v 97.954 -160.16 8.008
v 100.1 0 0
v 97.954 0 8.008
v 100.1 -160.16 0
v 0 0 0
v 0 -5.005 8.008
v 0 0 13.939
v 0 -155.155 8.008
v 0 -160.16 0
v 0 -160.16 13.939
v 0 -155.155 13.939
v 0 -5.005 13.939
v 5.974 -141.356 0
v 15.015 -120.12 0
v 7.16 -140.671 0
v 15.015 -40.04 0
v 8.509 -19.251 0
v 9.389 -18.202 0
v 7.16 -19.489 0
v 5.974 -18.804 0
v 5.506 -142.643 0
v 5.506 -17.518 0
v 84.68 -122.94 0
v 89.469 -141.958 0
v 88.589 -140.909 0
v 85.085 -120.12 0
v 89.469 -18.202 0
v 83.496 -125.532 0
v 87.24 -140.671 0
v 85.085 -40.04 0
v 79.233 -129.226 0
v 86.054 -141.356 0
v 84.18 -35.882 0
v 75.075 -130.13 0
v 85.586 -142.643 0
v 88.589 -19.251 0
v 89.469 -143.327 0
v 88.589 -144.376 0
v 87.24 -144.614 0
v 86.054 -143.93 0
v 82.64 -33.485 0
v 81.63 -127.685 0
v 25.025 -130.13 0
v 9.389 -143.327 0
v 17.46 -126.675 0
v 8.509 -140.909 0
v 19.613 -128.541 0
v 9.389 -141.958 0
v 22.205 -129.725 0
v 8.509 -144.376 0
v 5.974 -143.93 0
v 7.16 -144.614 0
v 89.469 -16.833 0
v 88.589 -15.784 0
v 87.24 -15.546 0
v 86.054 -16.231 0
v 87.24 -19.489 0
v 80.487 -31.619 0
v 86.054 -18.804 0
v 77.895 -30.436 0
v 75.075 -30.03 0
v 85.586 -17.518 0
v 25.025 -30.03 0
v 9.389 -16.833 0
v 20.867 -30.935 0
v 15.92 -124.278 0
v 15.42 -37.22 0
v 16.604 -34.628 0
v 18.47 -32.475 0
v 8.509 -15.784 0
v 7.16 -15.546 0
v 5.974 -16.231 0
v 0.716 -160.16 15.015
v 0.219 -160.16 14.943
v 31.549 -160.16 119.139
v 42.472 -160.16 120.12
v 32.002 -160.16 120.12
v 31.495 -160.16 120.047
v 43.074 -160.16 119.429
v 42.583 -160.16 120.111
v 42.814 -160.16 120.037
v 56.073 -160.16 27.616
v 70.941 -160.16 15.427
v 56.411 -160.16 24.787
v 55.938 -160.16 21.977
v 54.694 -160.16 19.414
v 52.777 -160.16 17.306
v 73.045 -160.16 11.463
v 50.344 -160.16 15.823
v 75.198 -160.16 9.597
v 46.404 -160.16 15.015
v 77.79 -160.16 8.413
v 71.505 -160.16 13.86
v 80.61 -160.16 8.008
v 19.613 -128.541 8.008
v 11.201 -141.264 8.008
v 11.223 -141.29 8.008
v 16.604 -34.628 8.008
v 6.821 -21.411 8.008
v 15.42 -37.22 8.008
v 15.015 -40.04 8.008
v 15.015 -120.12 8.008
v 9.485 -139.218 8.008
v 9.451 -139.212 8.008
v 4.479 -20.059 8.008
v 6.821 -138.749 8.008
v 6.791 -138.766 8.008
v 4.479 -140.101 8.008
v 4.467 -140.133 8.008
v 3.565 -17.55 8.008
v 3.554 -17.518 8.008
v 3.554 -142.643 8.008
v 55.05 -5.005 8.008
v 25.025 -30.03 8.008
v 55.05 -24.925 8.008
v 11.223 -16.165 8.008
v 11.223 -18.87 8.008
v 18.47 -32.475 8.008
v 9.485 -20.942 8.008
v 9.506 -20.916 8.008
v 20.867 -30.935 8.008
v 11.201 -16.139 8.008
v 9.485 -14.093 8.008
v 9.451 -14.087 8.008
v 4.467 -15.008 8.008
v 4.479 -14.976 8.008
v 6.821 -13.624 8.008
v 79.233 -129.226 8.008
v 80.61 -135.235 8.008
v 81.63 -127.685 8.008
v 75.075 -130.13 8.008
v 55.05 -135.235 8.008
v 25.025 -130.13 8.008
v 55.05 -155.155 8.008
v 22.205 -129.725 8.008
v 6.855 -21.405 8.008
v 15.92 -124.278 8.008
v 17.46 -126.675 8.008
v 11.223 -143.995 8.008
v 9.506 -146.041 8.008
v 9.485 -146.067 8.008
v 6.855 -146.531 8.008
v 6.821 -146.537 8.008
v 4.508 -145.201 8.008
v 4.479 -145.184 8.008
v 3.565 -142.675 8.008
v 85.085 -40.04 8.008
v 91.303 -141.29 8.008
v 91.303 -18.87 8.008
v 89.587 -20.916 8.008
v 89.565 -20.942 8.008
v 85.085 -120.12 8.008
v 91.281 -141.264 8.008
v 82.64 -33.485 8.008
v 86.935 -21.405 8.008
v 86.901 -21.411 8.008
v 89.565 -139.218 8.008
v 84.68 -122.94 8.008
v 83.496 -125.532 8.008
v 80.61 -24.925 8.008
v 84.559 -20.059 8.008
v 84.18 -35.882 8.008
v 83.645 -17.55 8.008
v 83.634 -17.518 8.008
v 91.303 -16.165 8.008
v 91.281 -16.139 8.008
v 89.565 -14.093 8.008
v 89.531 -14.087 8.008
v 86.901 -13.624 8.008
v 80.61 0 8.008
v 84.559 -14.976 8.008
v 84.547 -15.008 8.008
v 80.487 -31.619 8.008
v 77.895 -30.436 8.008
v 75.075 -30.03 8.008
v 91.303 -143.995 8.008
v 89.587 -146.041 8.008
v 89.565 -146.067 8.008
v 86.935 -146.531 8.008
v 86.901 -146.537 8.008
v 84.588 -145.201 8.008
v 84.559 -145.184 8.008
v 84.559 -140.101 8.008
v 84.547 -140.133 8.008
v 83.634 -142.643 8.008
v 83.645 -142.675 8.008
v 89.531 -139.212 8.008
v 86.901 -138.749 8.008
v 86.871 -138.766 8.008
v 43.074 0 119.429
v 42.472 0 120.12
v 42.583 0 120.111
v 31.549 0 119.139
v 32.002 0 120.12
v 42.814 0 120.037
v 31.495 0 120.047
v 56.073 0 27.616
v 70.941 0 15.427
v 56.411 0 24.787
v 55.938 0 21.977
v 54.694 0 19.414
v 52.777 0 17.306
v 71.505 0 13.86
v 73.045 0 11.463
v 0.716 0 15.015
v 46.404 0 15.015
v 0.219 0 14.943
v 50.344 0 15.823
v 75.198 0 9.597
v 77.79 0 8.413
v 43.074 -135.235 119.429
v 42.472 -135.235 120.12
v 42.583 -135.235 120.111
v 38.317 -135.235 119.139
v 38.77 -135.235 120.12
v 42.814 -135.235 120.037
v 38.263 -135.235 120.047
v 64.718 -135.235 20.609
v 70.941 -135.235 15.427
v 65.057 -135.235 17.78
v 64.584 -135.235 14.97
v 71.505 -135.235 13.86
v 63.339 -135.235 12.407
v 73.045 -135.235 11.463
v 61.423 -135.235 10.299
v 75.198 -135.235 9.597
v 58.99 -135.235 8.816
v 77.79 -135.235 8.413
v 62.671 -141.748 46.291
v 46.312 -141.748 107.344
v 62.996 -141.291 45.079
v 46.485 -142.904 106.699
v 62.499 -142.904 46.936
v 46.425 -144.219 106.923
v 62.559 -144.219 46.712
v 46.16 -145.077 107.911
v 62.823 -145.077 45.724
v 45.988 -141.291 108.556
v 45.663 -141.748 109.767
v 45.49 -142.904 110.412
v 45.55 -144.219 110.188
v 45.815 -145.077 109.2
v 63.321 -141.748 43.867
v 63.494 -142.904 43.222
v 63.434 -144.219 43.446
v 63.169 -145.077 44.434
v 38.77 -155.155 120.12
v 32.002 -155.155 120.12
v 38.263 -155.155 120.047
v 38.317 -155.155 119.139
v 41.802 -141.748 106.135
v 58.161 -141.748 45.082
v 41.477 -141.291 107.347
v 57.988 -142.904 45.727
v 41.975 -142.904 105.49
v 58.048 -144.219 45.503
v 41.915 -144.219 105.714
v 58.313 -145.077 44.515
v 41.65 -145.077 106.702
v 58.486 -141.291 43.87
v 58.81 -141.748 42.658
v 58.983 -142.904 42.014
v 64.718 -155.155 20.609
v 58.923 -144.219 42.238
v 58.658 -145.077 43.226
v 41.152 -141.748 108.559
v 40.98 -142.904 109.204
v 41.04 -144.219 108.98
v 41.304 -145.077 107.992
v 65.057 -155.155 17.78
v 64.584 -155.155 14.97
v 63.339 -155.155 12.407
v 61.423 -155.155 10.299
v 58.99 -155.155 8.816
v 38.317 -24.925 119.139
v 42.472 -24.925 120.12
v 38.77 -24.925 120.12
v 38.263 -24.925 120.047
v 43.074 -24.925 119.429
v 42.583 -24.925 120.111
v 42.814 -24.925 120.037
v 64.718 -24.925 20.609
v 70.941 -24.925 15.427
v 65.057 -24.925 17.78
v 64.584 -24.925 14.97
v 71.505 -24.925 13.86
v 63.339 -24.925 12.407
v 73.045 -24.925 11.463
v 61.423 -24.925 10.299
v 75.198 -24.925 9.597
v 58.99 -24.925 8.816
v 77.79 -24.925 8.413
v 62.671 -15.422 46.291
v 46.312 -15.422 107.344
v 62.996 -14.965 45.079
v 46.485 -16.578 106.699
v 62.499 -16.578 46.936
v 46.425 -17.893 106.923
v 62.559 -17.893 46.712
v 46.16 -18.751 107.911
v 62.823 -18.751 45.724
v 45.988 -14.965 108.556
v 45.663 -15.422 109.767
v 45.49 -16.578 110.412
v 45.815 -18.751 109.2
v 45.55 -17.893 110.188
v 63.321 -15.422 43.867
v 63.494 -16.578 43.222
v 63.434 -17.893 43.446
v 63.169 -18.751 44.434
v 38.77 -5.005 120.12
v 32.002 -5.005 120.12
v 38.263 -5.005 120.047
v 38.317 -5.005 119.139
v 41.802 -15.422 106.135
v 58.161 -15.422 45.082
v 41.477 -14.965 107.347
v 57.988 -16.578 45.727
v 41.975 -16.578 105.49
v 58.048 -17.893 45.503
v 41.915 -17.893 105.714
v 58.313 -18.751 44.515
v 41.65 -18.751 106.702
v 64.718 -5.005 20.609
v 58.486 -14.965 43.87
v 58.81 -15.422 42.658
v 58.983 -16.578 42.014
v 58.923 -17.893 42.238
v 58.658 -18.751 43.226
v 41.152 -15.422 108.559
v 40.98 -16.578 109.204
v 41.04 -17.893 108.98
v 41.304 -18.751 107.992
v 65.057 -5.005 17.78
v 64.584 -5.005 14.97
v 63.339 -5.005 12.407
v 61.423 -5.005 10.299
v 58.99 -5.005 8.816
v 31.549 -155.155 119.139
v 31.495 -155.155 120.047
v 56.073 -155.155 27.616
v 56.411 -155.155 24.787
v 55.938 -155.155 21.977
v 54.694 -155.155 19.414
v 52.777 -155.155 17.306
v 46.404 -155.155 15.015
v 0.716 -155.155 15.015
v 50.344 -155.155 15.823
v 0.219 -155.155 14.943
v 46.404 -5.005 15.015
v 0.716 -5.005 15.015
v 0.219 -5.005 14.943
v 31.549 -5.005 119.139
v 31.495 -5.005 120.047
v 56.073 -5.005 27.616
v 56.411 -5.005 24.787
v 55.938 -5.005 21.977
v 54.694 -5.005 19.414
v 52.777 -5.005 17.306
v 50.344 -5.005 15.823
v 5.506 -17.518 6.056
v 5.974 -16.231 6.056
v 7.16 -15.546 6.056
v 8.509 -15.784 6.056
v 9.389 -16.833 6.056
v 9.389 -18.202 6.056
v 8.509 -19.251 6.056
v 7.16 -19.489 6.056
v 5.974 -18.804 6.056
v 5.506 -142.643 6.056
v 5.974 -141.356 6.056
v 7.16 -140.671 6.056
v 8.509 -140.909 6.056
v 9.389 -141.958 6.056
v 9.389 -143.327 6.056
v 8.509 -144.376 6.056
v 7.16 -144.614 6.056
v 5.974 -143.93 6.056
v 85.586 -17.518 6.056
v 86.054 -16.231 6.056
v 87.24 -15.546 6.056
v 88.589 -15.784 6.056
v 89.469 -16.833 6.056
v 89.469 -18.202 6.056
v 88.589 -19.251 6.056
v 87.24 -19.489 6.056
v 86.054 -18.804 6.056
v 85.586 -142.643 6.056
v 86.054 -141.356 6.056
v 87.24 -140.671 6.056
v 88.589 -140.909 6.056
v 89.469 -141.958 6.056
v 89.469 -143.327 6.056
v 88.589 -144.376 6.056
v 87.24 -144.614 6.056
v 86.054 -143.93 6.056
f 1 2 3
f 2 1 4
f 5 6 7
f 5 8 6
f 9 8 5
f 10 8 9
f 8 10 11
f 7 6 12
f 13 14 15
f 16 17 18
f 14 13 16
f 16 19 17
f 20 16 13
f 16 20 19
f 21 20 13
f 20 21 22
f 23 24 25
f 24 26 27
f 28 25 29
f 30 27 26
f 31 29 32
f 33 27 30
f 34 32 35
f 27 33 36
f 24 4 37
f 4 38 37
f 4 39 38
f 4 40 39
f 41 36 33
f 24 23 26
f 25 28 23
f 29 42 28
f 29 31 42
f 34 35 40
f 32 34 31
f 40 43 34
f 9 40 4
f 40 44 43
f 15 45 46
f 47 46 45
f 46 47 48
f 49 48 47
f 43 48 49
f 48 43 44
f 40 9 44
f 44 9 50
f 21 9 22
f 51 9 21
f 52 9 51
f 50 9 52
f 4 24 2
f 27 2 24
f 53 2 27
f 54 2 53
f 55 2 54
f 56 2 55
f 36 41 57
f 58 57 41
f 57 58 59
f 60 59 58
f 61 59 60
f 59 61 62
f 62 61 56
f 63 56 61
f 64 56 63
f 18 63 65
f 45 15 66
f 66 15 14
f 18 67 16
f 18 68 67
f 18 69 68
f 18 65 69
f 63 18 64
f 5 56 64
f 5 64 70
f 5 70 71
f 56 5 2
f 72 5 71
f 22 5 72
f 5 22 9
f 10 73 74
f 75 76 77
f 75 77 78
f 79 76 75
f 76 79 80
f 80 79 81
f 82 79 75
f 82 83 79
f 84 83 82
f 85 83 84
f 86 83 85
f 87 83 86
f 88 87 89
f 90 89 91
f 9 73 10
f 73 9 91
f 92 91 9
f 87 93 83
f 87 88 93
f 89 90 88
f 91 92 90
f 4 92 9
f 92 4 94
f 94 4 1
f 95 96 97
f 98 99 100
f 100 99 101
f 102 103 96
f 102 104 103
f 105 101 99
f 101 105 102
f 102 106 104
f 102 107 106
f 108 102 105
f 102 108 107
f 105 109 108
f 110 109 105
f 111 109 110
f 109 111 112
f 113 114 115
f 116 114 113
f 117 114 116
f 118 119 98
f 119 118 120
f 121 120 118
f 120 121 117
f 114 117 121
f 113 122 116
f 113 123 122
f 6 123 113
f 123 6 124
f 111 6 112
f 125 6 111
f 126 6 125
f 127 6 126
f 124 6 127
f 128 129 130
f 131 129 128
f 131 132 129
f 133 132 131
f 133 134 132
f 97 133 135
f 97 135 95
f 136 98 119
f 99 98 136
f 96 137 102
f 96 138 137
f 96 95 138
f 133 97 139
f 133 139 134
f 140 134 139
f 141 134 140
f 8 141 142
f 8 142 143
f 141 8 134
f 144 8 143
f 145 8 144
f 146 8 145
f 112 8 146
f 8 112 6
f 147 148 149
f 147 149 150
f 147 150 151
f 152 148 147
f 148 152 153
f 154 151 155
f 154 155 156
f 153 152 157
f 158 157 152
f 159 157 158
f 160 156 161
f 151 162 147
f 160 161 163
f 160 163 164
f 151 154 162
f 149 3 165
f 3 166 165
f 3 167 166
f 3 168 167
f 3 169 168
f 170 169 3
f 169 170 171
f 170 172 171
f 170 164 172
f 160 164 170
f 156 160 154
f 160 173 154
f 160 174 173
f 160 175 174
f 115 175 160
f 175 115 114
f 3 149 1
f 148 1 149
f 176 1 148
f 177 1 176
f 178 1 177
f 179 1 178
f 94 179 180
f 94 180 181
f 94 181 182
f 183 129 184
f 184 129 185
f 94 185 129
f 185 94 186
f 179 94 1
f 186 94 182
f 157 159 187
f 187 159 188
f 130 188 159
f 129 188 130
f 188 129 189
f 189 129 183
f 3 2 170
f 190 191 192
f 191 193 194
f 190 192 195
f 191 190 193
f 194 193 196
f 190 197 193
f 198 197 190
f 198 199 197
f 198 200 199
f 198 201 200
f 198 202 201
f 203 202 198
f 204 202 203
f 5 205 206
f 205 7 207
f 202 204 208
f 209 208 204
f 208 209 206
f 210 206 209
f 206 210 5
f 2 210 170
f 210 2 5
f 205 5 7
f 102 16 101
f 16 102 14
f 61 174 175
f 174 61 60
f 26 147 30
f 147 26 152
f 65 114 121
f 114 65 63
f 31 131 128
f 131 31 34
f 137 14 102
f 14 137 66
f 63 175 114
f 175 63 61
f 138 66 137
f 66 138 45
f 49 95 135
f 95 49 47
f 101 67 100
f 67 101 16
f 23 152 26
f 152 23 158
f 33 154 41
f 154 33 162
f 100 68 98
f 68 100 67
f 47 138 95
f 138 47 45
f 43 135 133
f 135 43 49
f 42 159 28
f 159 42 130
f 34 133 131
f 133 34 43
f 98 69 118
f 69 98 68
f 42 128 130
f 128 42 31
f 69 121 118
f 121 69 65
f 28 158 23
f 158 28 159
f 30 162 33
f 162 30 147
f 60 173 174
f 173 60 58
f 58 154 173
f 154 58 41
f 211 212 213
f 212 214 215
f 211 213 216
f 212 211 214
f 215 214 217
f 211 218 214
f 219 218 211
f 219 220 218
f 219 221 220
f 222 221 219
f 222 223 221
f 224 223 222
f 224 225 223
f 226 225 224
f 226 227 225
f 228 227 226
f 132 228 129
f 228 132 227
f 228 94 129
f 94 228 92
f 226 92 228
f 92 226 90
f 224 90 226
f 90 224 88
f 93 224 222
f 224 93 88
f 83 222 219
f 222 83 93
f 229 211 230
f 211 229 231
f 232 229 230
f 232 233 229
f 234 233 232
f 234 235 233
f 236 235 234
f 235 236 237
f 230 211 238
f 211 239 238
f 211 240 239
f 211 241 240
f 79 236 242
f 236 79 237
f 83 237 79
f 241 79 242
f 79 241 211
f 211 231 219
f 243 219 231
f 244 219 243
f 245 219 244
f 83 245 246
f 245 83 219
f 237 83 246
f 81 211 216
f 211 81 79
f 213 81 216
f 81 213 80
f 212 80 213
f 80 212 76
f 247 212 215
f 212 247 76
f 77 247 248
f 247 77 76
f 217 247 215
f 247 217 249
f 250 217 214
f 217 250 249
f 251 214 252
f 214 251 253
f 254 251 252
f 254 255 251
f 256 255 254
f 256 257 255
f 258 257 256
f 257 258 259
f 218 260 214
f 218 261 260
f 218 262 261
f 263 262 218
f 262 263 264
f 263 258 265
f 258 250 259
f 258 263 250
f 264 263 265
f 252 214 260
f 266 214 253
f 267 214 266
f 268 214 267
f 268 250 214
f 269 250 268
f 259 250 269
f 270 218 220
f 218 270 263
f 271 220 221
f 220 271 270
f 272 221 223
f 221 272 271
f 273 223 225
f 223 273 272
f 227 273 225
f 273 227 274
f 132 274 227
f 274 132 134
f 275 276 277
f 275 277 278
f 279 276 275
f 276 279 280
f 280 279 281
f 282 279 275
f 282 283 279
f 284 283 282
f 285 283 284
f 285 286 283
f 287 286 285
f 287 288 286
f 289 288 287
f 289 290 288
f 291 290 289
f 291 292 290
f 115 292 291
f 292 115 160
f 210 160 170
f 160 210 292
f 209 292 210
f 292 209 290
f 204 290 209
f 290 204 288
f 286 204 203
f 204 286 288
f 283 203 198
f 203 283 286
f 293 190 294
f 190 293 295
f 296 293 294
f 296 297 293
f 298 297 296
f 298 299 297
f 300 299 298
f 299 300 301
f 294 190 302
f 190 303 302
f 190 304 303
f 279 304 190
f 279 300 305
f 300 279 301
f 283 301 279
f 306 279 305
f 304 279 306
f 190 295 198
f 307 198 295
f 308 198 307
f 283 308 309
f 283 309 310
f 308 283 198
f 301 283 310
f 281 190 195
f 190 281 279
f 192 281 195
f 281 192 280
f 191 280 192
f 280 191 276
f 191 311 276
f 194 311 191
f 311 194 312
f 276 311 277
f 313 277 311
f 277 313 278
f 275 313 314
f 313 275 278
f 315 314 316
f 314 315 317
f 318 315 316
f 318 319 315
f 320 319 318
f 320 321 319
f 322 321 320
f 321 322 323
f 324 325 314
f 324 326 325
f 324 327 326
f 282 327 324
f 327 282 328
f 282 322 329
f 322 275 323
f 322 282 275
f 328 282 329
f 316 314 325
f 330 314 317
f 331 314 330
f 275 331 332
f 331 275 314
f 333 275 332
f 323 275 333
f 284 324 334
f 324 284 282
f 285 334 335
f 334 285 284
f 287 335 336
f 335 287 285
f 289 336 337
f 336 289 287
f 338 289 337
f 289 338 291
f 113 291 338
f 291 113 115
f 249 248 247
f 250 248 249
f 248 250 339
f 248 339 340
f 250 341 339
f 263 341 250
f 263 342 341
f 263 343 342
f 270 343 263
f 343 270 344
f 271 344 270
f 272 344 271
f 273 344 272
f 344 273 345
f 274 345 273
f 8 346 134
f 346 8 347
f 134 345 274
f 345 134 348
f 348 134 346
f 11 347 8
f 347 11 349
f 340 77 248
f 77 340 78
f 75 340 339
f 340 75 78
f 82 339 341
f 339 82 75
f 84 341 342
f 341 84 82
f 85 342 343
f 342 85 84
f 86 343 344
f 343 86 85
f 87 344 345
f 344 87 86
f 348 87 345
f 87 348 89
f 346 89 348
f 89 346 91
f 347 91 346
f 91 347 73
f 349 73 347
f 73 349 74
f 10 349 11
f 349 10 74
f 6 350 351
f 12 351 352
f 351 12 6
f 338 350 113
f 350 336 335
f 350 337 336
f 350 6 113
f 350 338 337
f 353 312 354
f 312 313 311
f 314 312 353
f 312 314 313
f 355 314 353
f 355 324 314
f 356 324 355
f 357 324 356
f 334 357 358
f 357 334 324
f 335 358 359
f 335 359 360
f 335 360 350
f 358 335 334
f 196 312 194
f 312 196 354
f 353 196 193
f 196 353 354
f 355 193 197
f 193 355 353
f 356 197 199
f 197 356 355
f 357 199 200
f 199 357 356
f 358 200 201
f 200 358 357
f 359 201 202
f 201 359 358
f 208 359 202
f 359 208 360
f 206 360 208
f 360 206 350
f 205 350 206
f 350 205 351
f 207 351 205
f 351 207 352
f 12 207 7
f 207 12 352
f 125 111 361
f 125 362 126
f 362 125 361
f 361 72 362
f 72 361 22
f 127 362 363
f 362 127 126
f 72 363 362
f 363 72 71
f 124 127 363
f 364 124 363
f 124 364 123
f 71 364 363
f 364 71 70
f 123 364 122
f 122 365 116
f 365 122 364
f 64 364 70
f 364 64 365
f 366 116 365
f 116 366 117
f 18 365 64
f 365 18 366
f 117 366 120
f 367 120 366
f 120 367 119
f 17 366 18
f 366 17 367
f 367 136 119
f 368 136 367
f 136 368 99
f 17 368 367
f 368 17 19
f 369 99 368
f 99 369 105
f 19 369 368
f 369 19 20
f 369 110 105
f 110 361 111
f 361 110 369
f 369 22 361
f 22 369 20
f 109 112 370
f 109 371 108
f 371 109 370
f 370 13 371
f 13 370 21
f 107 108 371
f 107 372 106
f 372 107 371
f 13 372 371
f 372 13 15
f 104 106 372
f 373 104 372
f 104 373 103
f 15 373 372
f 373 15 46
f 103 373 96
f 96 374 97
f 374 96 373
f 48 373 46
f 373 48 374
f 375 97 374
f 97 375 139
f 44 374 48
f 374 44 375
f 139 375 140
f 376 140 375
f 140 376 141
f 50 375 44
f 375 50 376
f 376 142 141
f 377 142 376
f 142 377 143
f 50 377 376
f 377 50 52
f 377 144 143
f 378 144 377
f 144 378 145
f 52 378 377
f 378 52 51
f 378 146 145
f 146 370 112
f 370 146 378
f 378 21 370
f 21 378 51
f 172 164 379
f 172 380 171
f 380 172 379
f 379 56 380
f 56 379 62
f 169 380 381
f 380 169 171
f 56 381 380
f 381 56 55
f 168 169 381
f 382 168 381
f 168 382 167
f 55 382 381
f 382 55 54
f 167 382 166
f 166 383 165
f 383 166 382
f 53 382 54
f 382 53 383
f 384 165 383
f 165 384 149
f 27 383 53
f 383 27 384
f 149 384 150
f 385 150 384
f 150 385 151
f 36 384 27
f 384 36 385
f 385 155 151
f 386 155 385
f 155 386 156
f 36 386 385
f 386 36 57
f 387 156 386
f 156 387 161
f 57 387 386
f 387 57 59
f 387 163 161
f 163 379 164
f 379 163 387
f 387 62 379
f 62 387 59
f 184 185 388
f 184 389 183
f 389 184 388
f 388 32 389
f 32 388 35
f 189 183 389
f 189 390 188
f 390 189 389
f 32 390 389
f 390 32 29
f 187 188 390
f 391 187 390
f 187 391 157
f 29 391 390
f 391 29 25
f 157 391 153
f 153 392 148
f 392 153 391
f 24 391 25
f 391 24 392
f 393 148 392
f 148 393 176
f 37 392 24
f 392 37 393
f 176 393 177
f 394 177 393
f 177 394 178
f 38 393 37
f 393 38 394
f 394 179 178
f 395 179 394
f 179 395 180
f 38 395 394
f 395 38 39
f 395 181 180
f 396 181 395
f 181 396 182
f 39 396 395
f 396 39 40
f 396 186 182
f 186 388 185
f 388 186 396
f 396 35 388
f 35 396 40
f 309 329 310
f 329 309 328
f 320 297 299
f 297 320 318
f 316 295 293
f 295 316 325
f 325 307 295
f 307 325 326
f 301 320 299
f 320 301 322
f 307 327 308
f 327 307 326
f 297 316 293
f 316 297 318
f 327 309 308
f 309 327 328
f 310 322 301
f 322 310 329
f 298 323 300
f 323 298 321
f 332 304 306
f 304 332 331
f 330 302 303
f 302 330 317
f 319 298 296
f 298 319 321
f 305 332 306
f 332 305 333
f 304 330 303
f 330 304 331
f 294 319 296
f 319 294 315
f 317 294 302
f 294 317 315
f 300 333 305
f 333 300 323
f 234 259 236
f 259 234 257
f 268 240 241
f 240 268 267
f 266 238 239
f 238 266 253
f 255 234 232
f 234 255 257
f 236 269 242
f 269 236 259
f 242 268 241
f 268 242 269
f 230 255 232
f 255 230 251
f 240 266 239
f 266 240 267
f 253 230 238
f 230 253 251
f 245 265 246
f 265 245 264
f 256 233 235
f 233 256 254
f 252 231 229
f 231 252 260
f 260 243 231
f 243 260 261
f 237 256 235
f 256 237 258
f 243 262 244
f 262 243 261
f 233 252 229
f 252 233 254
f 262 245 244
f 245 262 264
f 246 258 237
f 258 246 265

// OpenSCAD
//------------------------------------------------------------------
/*

Simple Display Stand for Rasberry Pi 7" Display

Similar to: http://www.thingiverse.com/thing:1021025

But:

1) OpenSCAD.
2) Allow the usb power port to be at the bottom (normal display orientation).
3) Provide mounting holes on the foot.
4) Variable thickness display supports to accomodate various M3 screw lengths.
5) Added webbing for better strength.
6) Adjustable foot size for better free-standing stability.

*/
//------------------------------------------------------------------
/* [Global] */

display_angle = 15;

base_height = 8;
base_length = 160;
base_width = 100;
base_mount_hole_diameter = 4;
base_hole_rounding = 10;
base_mount_hole_posn = 0.8;

foot_sizex = 15;
foot_sizey = 30;

support_posn = 0.75;
support_height = 120;
support_thickness = 5;
support_hole2edge = 8;

web_thickness = 7;
web_radius = 10;

/* [Hidden] */
//------------------------------------------------------------------
// utility functions

// scaling
pla_shrink = 1/0.999; //~0.1%
abs_shrink = 1/0.995; //~0.5%
function scale(x) = pla_shrink * x;

// small tweak to avoid differencing artifacts
epsilon = 0.05;

// control the number of facets on cylinders
facet_epsilon = 0.1;
function facets(r) = 180 / acos(1 - (facet_epsilon / r));

// rounded/filleted edges
module inverse() {
  difference() {
    square(1e5, center=true);
    children(0);
  }
}
module rounded(r=1) {
  offset(r=r, $fn=facets(r)) offset(r=-r, $fn=facets(r)) children(0);
}
module filleted(r=1) {
  offset(r=-r, $fn=facets(r)) render() offset(r=r, $fn=facets(r)) children(0);
}

//------------------------------------------------------------------

// 4 x M3 mounting holes on display
mount_hole_w = scale(126.20);
mount_hole_h = scale(65.65);
display_mhr = scale(3.9/2);

// derived values
base_h = scale(base_height);
base_w = scale(base_width);
base_l = scale(base_length);
base_hr = scale(base_hole_rounding);
base_mhr = scale(base_mount_hole_diameter/2);

foot_sx = scale(foot_sizex);

support_h = scale(support_height);
support_t = scale(support_thickness);
support_h2e = scale(support_hole2edge);

web_t = scale(web_thickness);
web_r = scale(web_radius);

support_face_w = support_h2e + ((base_l - mount_hole_w) / 2);
foot_sy = max(support_face_w, scale(foot_sizey));

//------------------------------------------------------------------
// general screw hole: length, radius, style

module hole(l, r, style) {
  if (style == "countersunk") {
    if (r > l) {
      points = [
        [0, 0],
        [(2 * r) - l, 0],
        [2 * r, l],
        [0, l]
      ];
      rotate_extrude($fn=facets(r)) polygon(points=points);
    } else {
      points = [
        [0, 0],
        [r, 0],
        [r, l - r],
        [2 * r, l],
        [0, l]
      ];
      rotate_extrude($fn=facets(r)) polygon(points=points);
    }
  } else {
    // plain hole
    cylinder(h=l, r=r, $fn=facets(r));
  }
}

//------------------------------------------------------------------

module base_2d(h, w) {
  delta = h * tan(display_angle);
  points = [
    [0, 0],
    [0, h],
    [w - delta, h],
    [w, 0],
  ];
  polygon(points=points);
}

module support_2d(t) {
  d0 = support_h * tan(display_angle);
  d1 = t * cos(display_angle);
  x0 = base_w * support_posn;
  points = [
    [x0, 0],
    [x0 - d1, 0],
    [x0 - d1 - d0, support_h],
    [x0 - d0, support_h],
  ];
  polygon(points=points);
}

//------------------------------------------------------------------
// web

module web_profile() {
  filleted(r=web_r) union() {
    support_2d(support_t + web_t);
    base_2d(base_h + web_t, base_w * support_posn);
  }
}

module web_right() {
  linear_extrude(height=support_t) web_profile();
}

module web_left() {
  translate([0,0,base_l - support_t]) web_right();
}

module web() {
  web_left();
  web_right();
}

//------------------------------------------------------------------
// base

module base_body_profile() {
  base_2d(base_h, base_w);
}

module base_hole_profile() {
  sx = base_w - (2 * foot_sx);
  sy = base_l - (2 * foot_sy);
  rounded(r=base_hr) square(size=[sx, sy]);
}

module base() {
  h = base_h + (2 * epsilon);
  difference() {
    linear_extrude(height=base_l) base_body_profile();
    translate([foot_sx,base_h + epsilon,foot_sy]) rotate([90,0,0]) linear_extrude(height=h) base_hole_profile();
  }
}

module base_mount_hole() {
  l = base_h + (2 * epsilon);
  translate([0,-epsilon,0]) rotate([-90,0,0]) hole(l=l, r=base_mhr, style="countersunk");
}

module base_mount_holes() {
  z0 = (foot_sy + support_t) / 2;
  z1 = base_l - z0;
  x0 = foot_sx / 2;
  x1 = x0 + (base_mount_hole_posn * base_w);
  union() {
    translate([x0,0,z0]) base_mount_hole();
    translate([x0,0,z1]) base_mount_hole();
    translate([x1,0,z0]) base_mount_hole();
    translate([x1,0,z1]) base_mount_hole();
  }
}

//------------------------------------------------------------------
// supports

module support_profile() {
  filleted(r=web_r) union() {
    base_2d(base_h, base_w);
    support_2d(support_t);
  }
}

module support_right() {
  linear_extrude(height=support_face_w) support_profile();
}

module support_left() {
  translate([0,0,base_l - support_face_w]) support_right();
}

module support() {
  support_left();
  support_right();
}

module display_mount_hole() {
  l = support_t + (2 * epsilon);
  rotate([0,90,0]) hole(l=l, r=display_mhr, style = "plain");
}

module display_mount_holes() {
  dx0 = base_w * support_posn;
  dx = support_t + epsilon;
  dy = support_h - mount_hole_h - (support_h2e * cos(display_angle));
  dz = (base_l - mount_hole_w) / 2;
  translate([dx0, 0,0]) rotate([0,0,display_angle]) translate([-dx,dy,dz]) union() {
    dx = mount_hole_w;
    dy = mount_hole_h;
    translate([0,0,0]) display_mount_hole();
    translate([0,dy,0]) display_mount_hole();
    translate([0,dy,dx]) display_mount_hole();
    translate([0,0,dx]) display_mount_hole();
  }
}

//------------------------------------------------------------------

module display_stand() {
  difference() {
    union() {
      base();
      support();
      web();
    }
    union() {
      base_mount_holes();
      display_mount_holes();
    }
  }
}

rotate([90,0,0]) display_stand();

//------------------------------------------------------------------
